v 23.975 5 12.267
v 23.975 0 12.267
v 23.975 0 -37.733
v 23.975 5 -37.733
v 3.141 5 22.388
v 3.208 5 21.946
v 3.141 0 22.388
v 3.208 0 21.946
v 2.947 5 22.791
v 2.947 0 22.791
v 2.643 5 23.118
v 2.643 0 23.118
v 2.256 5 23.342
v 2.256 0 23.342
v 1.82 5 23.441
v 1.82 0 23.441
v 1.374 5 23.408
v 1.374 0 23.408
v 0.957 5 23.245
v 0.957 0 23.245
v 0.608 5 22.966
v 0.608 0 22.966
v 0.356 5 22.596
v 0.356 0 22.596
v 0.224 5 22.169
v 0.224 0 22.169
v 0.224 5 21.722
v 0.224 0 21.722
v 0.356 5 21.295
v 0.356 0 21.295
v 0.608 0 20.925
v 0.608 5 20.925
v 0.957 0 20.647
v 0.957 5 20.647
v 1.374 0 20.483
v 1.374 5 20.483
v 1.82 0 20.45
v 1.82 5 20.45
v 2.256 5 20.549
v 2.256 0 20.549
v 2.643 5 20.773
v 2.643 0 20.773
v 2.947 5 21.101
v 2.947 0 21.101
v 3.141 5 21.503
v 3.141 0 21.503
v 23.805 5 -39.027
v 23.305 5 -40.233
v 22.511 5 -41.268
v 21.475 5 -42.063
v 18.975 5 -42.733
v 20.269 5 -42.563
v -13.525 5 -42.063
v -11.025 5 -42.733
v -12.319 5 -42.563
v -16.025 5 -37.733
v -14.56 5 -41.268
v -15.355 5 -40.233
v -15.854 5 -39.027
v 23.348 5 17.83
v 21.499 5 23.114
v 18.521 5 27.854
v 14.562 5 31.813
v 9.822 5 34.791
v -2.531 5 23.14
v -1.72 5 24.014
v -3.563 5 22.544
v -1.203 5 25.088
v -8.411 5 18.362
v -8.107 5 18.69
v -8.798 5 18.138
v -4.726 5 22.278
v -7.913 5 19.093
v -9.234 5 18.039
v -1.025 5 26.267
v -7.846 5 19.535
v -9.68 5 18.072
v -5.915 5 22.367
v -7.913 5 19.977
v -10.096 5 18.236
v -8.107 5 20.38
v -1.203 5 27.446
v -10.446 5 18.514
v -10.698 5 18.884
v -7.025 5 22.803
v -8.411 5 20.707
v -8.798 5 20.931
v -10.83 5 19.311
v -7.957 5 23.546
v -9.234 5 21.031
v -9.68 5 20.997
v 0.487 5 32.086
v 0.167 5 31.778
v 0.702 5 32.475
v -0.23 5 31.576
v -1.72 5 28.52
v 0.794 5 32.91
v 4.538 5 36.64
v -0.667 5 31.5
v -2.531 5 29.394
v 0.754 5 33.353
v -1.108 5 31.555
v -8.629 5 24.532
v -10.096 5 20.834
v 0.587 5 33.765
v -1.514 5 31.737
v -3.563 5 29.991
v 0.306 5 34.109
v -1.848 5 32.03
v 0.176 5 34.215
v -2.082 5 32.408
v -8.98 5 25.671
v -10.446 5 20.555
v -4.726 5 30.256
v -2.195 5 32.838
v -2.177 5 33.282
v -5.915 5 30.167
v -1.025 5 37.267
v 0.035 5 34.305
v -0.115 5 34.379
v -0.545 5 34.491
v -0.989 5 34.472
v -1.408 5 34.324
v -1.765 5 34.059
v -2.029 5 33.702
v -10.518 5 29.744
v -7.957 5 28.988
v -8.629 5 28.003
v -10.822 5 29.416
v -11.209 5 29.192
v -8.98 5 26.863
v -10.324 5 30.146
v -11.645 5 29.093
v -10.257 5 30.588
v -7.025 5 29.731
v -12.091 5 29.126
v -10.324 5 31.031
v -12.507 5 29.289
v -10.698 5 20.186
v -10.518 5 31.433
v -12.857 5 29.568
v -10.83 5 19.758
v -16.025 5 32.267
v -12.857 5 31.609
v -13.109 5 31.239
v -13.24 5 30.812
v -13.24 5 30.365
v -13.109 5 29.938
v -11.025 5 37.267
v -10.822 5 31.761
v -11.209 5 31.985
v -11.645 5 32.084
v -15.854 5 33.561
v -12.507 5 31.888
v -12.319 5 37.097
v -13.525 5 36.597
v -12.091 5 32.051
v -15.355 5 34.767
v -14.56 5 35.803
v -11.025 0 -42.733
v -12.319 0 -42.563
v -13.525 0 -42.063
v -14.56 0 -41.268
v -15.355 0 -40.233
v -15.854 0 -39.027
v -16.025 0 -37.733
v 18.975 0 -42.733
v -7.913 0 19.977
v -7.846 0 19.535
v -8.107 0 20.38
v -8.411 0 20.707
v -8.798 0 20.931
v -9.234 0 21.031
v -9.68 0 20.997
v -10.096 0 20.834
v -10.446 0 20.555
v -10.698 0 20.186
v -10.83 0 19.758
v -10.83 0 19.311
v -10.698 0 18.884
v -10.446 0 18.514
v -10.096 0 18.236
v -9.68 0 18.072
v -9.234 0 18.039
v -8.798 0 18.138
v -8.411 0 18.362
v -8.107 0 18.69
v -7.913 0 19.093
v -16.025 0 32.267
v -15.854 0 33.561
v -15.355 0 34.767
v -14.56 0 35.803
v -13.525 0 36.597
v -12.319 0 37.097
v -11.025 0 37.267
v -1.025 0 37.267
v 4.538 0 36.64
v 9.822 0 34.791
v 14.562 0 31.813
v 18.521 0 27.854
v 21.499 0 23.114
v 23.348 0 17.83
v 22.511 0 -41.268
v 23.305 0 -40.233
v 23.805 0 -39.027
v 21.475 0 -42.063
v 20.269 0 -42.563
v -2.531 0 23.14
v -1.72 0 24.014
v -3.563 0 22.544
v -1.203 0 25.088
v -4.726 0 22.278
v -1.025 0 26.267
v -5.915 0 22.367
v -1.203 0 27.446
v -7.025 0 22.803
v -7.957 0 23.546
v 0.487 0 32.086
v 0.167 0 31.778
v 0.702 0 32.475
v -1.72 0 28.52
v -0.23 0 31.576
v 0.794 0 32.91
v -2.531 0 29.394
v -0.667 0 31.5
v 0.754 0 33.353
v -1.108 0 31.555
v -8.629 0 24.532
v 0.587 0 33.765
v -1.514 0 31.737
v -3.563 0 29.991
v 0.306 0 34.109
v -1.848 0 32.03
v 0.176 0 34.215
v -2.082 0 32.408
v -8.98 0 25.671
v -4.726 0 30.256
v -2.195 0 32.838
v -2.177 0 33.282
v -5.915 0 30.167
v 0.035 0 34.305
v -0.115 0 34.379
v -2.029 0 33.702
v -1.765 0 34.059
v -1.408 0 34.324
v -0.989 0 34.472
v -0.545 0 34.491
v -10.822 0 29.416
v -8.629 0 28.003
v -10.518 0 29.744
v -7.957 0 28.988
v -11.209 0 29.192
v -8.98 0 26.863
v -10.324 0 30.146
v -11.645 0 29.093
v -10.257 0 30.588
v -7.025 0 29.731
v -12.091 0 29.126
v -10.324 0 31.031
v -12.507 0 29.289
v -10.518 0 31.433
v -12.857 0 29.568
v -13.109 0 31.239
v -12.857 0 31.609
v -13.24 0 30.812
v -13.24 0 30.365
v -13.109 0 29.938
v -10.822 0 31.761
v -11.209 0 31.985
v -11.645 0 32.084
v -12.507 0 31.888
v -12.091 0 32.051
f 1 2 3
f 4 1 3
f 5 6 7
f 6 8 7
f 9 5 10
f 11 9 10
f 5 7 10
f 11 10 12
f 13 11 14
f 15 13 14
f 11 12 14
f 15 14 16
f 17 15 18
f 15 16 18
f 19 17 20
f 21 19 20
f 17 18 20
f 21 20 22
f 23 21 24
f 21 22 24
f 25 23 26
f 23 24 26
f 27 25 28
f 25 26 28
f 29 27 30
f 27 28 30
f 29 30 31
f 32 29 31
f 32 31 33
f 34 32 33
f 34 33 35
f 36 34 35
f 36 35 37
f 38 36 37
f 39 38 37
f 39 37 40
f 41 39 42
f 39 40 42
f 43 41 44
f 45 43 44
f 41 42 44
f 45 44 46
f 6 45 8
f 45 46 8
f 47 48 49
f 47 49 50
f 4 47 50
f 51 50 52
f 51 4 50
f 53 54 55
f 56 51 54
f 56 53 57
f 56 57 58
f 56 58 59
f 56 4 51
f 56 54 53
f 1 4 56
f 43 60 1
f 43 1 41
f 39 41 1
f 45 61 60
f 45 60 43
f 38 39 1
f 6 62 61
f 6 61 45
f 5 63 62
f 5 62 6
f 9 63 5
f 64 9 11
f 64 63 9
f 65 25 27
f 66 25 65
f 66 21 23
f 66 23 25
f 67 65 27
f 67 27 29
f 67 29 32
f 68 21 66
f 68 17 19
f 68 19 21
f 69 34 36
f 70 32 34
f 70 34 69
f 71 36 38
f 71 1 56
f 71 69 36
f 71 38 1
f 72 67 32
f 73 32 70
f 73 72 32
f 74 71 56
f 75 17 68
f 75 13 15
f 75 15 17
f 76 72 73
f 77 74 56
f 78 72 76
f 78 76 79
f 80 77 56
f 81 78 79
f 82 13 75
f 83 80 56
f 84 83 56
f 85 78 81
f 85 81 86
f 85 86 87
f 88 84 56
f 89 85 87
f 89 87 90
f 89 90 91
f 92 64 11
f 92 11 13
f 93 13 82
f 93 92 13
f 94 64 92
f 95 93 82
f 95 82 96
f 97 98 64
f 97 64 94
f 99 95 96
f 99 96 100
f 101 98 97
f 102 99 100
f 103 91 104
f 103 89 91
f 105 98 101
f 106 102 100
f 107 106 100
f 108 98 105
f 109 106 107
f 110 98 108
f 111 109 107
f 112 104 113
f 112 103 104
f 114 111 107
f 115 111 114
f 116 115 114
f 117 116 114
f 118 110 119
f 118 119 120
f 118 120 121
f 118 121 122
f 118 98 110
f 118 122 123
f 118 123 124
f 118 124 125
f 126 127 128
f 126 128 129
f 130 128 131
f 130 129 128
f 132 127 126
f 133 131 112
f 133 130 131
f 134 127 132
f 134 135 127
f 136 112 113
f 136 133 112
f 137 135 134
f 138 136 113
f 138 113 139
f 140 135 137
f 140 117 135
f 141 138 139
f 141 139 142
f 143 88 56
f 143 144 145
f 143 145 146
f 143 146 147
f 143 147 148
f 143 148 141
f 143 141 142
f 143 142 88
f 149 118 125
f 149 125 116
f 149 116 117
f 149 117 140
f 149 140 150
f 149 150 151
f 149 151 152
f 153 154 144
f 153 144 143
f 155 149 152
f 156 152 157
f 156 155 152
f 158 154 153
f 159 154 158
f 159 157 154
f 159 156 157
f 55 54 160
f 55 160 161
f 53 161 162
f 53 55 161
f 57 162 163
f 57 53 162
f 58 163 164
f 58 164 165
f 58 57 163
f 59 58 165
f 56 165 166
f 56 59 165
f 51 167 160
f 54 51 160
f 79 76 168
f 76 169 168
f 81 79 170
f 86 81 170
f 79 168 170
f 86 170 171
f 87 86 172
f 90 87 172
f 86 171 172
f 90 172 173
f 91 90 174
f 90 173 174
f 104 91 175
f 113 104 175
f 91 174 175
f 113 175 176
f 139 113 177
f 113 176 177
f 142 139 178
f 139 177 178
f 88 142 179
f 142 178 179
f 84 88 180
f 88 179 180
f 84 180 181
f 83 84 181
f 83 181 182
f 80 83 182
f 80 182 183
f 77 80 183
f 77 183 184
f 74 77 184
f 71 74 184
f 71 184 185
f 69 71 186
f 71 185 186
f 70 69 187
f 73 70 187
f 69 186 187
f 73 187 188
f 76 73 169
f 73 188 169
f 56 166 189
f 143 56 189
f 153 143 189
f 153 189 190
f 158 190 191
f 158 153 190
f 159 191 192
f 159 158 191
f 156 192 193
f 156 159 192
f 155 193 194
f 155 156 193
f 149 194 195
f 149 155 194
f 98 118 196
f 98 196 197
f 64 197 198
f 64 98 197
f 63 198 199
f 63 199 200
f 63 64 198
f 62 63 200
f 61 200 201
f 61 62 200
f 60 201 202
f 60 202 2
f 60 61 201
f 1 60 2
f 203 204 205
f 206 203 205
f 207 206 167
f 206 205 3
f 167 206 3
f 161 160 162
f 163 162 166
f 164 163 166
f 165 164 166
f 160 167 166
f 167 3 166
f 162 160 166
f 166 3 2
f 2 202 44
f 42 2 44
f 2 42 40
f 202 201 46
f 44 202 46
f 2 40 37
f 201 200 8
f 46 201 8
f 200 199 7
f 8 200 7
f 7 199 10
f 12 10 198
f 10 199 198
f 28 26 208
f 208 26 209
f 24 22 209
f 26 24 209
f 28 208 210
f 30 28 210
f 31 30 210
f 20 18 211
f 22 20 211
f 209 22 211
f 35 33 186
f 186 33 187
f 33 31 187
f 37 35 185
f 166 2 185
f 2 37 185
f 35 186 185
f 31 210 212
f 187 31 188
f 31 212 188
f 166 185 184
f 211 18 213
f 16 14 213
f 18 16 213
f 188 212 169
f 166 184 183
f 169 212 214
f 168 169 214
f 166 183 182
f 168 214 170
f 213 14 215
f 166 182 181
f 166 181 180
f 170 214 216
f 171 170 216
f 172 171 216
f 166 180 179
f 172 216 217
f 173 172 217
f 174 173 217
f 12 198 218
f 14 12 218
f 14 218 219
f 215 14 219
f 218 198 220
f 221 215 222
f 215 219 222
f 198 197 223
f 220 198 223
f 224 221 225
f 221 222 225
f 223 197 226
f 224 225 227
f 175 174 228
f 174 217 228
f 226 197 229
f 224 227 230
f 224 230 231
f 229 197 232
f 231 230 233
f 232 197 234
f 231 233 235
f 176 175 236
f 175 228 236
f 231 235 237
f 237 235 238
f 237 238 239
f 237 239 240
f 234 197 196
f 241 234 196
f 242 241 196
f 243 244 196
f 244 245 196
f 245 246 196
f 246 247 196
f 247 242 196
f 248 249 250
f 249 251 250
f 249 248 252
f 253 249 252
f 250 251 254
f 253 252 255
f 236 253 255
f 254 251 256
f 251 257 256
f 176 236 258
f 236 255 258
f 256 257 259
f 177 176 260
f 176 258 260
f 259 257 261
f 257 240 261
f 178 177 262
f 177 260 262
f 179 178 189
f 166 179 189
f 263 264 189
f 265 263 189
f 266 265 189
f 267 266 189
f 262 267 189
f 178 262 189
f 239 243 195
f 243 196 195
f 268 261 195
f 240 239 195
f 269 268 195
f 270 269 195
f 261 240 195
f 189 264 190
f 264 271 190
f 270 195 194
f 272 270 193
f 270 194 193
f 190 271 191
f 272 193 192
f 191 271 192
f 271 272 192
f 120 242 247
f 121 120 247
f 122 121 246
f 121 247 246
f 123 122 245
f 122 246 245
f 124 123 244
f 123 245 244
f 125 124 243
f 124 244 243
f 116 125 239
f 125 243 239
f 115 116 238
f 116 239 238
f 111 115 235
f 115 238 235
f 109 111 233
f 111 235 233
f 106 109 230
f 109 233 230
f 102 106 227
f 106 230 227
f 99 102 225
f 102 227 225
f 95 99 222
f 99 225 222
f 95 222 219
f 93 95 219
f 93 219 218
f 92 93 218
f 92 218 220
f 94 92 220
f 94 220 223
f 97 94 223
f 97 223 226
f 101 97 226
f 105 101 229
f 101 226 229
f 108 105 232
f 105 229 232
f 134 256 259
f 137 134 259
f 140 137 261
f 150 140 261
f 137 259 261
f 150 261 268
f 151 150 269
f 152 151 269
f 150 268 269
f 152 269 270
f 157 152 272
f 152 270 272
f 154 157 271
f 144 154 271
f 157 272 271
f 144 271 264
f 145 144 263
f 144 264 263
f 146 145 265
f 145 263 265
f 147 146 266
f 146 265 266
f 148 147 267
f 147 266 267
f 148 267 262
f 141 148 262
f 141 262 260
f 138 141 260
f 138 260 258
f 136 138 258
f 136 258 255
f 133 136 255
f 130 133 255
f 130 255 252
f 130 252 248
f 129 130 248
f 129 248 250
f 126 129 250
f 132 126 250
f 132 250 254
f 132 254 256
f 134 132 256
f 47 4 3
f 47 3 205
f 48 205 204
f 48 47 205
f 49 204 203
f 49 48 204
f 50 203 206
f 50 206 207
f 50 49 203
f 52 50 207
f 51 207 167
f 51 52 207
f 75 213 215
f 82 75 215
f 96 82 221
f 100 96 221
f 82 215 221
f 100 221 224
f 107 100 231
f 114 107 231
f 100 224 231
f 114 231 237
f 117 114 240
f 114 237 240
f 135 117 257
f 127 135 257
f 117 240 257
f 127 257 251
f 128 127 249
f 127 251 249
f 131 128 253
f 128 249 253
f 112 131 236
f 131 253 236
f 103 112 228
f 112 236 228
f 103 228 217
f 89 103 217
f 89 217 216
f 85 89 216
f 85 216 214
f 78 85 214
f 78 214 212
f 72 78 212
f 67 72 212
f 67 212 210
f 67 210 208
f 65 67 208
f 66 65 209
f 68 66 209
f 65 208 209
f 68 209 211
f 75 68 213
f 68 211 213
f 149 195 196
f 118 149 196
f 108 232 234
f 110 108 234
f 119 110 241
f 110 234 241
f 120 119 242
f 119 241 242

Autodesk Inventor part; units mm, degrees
ref_plane "YZ Plane" through (0, 0, 0) normal (1, 0, 0) x (0, 1, 0)
ref_plane "XZ Plane" through (0, 0, 0) normal (0, 1, 0) x (-1, 0, 0)
ref_plane "XY Plane" through (0, 0, 0) normal (0, 0, 1) x (1, 0, 0)
sketch "Esquisse1" plane through (0, 0, 0) normal (0, 1, 0) x (-1, 0, 0)
  line L0 (16.0248, 37.2671) -> (-23.9752, 37.2671)
  line L1 (-23.9752, 37.2671) -> (-23.9752, -42.7329)
  line L2 (-23.9752, -42.7329) -> (16.0248, -42.7329)
  line L3 (16.0248, -42.7329) -> (16.0248, 37.2671)
  point P0 (0, 0)
  dimension "d0" = 80
  dimension "d1" = 40
extrude "Extrusion1" add sketch "Esquisse1" along normal blind 5
sketch "Esquisse2" plane through (0, 0, 0) normal (0, -1, 0) x (1, 0, 0)
  point P0 (0, 0)
sketch "Esquisse3" plane through (0, 0, 0) normal (0, -1, 0) x (1, 0, 0)
  arc A0 (-0.1148, 34.3792) -> (0.3059, 34.1091) centre (-0.7034, 32.9995) ccw projected
  circle A1 centre (1.7075, 21.9456) radius 1.5 projected
  circle A2 centre (-9.3463, 19.5347) radius 1.5 projected
  circle A3 centre (-11.7572, 30.5885) radius 1.25 projected
  circle A4 centre (-5.0248, 26.2671) radius 4 projected
  circle A5 centre (-0.7034, 32.9995) radius 1.5
  circle A6 centre (-11.7572, 30.5885) radius 1.5
  point P0 (0, 0)
  dimension "d6" = 3
extrude "Extrusion2" cut sketch "Esquisse3" against normal through all contours A5 A0 | A1 | A2 | A3 | A4 | A6
fillet "Congé1" radius 25 1 edges at (23.9752, 2.5, 37.2671)
fillet "Congé2" radius 5 1 edges at (23.9752, 2.5, -42.7329)
fillet "Congé3" radius 5 1 edges at (-16.0248, 2.5, -42.7329)
fillet "Congé4" radius 5 1 edges at (-16.0248, 2.5, 37.2671)
properties part number "trappe"
